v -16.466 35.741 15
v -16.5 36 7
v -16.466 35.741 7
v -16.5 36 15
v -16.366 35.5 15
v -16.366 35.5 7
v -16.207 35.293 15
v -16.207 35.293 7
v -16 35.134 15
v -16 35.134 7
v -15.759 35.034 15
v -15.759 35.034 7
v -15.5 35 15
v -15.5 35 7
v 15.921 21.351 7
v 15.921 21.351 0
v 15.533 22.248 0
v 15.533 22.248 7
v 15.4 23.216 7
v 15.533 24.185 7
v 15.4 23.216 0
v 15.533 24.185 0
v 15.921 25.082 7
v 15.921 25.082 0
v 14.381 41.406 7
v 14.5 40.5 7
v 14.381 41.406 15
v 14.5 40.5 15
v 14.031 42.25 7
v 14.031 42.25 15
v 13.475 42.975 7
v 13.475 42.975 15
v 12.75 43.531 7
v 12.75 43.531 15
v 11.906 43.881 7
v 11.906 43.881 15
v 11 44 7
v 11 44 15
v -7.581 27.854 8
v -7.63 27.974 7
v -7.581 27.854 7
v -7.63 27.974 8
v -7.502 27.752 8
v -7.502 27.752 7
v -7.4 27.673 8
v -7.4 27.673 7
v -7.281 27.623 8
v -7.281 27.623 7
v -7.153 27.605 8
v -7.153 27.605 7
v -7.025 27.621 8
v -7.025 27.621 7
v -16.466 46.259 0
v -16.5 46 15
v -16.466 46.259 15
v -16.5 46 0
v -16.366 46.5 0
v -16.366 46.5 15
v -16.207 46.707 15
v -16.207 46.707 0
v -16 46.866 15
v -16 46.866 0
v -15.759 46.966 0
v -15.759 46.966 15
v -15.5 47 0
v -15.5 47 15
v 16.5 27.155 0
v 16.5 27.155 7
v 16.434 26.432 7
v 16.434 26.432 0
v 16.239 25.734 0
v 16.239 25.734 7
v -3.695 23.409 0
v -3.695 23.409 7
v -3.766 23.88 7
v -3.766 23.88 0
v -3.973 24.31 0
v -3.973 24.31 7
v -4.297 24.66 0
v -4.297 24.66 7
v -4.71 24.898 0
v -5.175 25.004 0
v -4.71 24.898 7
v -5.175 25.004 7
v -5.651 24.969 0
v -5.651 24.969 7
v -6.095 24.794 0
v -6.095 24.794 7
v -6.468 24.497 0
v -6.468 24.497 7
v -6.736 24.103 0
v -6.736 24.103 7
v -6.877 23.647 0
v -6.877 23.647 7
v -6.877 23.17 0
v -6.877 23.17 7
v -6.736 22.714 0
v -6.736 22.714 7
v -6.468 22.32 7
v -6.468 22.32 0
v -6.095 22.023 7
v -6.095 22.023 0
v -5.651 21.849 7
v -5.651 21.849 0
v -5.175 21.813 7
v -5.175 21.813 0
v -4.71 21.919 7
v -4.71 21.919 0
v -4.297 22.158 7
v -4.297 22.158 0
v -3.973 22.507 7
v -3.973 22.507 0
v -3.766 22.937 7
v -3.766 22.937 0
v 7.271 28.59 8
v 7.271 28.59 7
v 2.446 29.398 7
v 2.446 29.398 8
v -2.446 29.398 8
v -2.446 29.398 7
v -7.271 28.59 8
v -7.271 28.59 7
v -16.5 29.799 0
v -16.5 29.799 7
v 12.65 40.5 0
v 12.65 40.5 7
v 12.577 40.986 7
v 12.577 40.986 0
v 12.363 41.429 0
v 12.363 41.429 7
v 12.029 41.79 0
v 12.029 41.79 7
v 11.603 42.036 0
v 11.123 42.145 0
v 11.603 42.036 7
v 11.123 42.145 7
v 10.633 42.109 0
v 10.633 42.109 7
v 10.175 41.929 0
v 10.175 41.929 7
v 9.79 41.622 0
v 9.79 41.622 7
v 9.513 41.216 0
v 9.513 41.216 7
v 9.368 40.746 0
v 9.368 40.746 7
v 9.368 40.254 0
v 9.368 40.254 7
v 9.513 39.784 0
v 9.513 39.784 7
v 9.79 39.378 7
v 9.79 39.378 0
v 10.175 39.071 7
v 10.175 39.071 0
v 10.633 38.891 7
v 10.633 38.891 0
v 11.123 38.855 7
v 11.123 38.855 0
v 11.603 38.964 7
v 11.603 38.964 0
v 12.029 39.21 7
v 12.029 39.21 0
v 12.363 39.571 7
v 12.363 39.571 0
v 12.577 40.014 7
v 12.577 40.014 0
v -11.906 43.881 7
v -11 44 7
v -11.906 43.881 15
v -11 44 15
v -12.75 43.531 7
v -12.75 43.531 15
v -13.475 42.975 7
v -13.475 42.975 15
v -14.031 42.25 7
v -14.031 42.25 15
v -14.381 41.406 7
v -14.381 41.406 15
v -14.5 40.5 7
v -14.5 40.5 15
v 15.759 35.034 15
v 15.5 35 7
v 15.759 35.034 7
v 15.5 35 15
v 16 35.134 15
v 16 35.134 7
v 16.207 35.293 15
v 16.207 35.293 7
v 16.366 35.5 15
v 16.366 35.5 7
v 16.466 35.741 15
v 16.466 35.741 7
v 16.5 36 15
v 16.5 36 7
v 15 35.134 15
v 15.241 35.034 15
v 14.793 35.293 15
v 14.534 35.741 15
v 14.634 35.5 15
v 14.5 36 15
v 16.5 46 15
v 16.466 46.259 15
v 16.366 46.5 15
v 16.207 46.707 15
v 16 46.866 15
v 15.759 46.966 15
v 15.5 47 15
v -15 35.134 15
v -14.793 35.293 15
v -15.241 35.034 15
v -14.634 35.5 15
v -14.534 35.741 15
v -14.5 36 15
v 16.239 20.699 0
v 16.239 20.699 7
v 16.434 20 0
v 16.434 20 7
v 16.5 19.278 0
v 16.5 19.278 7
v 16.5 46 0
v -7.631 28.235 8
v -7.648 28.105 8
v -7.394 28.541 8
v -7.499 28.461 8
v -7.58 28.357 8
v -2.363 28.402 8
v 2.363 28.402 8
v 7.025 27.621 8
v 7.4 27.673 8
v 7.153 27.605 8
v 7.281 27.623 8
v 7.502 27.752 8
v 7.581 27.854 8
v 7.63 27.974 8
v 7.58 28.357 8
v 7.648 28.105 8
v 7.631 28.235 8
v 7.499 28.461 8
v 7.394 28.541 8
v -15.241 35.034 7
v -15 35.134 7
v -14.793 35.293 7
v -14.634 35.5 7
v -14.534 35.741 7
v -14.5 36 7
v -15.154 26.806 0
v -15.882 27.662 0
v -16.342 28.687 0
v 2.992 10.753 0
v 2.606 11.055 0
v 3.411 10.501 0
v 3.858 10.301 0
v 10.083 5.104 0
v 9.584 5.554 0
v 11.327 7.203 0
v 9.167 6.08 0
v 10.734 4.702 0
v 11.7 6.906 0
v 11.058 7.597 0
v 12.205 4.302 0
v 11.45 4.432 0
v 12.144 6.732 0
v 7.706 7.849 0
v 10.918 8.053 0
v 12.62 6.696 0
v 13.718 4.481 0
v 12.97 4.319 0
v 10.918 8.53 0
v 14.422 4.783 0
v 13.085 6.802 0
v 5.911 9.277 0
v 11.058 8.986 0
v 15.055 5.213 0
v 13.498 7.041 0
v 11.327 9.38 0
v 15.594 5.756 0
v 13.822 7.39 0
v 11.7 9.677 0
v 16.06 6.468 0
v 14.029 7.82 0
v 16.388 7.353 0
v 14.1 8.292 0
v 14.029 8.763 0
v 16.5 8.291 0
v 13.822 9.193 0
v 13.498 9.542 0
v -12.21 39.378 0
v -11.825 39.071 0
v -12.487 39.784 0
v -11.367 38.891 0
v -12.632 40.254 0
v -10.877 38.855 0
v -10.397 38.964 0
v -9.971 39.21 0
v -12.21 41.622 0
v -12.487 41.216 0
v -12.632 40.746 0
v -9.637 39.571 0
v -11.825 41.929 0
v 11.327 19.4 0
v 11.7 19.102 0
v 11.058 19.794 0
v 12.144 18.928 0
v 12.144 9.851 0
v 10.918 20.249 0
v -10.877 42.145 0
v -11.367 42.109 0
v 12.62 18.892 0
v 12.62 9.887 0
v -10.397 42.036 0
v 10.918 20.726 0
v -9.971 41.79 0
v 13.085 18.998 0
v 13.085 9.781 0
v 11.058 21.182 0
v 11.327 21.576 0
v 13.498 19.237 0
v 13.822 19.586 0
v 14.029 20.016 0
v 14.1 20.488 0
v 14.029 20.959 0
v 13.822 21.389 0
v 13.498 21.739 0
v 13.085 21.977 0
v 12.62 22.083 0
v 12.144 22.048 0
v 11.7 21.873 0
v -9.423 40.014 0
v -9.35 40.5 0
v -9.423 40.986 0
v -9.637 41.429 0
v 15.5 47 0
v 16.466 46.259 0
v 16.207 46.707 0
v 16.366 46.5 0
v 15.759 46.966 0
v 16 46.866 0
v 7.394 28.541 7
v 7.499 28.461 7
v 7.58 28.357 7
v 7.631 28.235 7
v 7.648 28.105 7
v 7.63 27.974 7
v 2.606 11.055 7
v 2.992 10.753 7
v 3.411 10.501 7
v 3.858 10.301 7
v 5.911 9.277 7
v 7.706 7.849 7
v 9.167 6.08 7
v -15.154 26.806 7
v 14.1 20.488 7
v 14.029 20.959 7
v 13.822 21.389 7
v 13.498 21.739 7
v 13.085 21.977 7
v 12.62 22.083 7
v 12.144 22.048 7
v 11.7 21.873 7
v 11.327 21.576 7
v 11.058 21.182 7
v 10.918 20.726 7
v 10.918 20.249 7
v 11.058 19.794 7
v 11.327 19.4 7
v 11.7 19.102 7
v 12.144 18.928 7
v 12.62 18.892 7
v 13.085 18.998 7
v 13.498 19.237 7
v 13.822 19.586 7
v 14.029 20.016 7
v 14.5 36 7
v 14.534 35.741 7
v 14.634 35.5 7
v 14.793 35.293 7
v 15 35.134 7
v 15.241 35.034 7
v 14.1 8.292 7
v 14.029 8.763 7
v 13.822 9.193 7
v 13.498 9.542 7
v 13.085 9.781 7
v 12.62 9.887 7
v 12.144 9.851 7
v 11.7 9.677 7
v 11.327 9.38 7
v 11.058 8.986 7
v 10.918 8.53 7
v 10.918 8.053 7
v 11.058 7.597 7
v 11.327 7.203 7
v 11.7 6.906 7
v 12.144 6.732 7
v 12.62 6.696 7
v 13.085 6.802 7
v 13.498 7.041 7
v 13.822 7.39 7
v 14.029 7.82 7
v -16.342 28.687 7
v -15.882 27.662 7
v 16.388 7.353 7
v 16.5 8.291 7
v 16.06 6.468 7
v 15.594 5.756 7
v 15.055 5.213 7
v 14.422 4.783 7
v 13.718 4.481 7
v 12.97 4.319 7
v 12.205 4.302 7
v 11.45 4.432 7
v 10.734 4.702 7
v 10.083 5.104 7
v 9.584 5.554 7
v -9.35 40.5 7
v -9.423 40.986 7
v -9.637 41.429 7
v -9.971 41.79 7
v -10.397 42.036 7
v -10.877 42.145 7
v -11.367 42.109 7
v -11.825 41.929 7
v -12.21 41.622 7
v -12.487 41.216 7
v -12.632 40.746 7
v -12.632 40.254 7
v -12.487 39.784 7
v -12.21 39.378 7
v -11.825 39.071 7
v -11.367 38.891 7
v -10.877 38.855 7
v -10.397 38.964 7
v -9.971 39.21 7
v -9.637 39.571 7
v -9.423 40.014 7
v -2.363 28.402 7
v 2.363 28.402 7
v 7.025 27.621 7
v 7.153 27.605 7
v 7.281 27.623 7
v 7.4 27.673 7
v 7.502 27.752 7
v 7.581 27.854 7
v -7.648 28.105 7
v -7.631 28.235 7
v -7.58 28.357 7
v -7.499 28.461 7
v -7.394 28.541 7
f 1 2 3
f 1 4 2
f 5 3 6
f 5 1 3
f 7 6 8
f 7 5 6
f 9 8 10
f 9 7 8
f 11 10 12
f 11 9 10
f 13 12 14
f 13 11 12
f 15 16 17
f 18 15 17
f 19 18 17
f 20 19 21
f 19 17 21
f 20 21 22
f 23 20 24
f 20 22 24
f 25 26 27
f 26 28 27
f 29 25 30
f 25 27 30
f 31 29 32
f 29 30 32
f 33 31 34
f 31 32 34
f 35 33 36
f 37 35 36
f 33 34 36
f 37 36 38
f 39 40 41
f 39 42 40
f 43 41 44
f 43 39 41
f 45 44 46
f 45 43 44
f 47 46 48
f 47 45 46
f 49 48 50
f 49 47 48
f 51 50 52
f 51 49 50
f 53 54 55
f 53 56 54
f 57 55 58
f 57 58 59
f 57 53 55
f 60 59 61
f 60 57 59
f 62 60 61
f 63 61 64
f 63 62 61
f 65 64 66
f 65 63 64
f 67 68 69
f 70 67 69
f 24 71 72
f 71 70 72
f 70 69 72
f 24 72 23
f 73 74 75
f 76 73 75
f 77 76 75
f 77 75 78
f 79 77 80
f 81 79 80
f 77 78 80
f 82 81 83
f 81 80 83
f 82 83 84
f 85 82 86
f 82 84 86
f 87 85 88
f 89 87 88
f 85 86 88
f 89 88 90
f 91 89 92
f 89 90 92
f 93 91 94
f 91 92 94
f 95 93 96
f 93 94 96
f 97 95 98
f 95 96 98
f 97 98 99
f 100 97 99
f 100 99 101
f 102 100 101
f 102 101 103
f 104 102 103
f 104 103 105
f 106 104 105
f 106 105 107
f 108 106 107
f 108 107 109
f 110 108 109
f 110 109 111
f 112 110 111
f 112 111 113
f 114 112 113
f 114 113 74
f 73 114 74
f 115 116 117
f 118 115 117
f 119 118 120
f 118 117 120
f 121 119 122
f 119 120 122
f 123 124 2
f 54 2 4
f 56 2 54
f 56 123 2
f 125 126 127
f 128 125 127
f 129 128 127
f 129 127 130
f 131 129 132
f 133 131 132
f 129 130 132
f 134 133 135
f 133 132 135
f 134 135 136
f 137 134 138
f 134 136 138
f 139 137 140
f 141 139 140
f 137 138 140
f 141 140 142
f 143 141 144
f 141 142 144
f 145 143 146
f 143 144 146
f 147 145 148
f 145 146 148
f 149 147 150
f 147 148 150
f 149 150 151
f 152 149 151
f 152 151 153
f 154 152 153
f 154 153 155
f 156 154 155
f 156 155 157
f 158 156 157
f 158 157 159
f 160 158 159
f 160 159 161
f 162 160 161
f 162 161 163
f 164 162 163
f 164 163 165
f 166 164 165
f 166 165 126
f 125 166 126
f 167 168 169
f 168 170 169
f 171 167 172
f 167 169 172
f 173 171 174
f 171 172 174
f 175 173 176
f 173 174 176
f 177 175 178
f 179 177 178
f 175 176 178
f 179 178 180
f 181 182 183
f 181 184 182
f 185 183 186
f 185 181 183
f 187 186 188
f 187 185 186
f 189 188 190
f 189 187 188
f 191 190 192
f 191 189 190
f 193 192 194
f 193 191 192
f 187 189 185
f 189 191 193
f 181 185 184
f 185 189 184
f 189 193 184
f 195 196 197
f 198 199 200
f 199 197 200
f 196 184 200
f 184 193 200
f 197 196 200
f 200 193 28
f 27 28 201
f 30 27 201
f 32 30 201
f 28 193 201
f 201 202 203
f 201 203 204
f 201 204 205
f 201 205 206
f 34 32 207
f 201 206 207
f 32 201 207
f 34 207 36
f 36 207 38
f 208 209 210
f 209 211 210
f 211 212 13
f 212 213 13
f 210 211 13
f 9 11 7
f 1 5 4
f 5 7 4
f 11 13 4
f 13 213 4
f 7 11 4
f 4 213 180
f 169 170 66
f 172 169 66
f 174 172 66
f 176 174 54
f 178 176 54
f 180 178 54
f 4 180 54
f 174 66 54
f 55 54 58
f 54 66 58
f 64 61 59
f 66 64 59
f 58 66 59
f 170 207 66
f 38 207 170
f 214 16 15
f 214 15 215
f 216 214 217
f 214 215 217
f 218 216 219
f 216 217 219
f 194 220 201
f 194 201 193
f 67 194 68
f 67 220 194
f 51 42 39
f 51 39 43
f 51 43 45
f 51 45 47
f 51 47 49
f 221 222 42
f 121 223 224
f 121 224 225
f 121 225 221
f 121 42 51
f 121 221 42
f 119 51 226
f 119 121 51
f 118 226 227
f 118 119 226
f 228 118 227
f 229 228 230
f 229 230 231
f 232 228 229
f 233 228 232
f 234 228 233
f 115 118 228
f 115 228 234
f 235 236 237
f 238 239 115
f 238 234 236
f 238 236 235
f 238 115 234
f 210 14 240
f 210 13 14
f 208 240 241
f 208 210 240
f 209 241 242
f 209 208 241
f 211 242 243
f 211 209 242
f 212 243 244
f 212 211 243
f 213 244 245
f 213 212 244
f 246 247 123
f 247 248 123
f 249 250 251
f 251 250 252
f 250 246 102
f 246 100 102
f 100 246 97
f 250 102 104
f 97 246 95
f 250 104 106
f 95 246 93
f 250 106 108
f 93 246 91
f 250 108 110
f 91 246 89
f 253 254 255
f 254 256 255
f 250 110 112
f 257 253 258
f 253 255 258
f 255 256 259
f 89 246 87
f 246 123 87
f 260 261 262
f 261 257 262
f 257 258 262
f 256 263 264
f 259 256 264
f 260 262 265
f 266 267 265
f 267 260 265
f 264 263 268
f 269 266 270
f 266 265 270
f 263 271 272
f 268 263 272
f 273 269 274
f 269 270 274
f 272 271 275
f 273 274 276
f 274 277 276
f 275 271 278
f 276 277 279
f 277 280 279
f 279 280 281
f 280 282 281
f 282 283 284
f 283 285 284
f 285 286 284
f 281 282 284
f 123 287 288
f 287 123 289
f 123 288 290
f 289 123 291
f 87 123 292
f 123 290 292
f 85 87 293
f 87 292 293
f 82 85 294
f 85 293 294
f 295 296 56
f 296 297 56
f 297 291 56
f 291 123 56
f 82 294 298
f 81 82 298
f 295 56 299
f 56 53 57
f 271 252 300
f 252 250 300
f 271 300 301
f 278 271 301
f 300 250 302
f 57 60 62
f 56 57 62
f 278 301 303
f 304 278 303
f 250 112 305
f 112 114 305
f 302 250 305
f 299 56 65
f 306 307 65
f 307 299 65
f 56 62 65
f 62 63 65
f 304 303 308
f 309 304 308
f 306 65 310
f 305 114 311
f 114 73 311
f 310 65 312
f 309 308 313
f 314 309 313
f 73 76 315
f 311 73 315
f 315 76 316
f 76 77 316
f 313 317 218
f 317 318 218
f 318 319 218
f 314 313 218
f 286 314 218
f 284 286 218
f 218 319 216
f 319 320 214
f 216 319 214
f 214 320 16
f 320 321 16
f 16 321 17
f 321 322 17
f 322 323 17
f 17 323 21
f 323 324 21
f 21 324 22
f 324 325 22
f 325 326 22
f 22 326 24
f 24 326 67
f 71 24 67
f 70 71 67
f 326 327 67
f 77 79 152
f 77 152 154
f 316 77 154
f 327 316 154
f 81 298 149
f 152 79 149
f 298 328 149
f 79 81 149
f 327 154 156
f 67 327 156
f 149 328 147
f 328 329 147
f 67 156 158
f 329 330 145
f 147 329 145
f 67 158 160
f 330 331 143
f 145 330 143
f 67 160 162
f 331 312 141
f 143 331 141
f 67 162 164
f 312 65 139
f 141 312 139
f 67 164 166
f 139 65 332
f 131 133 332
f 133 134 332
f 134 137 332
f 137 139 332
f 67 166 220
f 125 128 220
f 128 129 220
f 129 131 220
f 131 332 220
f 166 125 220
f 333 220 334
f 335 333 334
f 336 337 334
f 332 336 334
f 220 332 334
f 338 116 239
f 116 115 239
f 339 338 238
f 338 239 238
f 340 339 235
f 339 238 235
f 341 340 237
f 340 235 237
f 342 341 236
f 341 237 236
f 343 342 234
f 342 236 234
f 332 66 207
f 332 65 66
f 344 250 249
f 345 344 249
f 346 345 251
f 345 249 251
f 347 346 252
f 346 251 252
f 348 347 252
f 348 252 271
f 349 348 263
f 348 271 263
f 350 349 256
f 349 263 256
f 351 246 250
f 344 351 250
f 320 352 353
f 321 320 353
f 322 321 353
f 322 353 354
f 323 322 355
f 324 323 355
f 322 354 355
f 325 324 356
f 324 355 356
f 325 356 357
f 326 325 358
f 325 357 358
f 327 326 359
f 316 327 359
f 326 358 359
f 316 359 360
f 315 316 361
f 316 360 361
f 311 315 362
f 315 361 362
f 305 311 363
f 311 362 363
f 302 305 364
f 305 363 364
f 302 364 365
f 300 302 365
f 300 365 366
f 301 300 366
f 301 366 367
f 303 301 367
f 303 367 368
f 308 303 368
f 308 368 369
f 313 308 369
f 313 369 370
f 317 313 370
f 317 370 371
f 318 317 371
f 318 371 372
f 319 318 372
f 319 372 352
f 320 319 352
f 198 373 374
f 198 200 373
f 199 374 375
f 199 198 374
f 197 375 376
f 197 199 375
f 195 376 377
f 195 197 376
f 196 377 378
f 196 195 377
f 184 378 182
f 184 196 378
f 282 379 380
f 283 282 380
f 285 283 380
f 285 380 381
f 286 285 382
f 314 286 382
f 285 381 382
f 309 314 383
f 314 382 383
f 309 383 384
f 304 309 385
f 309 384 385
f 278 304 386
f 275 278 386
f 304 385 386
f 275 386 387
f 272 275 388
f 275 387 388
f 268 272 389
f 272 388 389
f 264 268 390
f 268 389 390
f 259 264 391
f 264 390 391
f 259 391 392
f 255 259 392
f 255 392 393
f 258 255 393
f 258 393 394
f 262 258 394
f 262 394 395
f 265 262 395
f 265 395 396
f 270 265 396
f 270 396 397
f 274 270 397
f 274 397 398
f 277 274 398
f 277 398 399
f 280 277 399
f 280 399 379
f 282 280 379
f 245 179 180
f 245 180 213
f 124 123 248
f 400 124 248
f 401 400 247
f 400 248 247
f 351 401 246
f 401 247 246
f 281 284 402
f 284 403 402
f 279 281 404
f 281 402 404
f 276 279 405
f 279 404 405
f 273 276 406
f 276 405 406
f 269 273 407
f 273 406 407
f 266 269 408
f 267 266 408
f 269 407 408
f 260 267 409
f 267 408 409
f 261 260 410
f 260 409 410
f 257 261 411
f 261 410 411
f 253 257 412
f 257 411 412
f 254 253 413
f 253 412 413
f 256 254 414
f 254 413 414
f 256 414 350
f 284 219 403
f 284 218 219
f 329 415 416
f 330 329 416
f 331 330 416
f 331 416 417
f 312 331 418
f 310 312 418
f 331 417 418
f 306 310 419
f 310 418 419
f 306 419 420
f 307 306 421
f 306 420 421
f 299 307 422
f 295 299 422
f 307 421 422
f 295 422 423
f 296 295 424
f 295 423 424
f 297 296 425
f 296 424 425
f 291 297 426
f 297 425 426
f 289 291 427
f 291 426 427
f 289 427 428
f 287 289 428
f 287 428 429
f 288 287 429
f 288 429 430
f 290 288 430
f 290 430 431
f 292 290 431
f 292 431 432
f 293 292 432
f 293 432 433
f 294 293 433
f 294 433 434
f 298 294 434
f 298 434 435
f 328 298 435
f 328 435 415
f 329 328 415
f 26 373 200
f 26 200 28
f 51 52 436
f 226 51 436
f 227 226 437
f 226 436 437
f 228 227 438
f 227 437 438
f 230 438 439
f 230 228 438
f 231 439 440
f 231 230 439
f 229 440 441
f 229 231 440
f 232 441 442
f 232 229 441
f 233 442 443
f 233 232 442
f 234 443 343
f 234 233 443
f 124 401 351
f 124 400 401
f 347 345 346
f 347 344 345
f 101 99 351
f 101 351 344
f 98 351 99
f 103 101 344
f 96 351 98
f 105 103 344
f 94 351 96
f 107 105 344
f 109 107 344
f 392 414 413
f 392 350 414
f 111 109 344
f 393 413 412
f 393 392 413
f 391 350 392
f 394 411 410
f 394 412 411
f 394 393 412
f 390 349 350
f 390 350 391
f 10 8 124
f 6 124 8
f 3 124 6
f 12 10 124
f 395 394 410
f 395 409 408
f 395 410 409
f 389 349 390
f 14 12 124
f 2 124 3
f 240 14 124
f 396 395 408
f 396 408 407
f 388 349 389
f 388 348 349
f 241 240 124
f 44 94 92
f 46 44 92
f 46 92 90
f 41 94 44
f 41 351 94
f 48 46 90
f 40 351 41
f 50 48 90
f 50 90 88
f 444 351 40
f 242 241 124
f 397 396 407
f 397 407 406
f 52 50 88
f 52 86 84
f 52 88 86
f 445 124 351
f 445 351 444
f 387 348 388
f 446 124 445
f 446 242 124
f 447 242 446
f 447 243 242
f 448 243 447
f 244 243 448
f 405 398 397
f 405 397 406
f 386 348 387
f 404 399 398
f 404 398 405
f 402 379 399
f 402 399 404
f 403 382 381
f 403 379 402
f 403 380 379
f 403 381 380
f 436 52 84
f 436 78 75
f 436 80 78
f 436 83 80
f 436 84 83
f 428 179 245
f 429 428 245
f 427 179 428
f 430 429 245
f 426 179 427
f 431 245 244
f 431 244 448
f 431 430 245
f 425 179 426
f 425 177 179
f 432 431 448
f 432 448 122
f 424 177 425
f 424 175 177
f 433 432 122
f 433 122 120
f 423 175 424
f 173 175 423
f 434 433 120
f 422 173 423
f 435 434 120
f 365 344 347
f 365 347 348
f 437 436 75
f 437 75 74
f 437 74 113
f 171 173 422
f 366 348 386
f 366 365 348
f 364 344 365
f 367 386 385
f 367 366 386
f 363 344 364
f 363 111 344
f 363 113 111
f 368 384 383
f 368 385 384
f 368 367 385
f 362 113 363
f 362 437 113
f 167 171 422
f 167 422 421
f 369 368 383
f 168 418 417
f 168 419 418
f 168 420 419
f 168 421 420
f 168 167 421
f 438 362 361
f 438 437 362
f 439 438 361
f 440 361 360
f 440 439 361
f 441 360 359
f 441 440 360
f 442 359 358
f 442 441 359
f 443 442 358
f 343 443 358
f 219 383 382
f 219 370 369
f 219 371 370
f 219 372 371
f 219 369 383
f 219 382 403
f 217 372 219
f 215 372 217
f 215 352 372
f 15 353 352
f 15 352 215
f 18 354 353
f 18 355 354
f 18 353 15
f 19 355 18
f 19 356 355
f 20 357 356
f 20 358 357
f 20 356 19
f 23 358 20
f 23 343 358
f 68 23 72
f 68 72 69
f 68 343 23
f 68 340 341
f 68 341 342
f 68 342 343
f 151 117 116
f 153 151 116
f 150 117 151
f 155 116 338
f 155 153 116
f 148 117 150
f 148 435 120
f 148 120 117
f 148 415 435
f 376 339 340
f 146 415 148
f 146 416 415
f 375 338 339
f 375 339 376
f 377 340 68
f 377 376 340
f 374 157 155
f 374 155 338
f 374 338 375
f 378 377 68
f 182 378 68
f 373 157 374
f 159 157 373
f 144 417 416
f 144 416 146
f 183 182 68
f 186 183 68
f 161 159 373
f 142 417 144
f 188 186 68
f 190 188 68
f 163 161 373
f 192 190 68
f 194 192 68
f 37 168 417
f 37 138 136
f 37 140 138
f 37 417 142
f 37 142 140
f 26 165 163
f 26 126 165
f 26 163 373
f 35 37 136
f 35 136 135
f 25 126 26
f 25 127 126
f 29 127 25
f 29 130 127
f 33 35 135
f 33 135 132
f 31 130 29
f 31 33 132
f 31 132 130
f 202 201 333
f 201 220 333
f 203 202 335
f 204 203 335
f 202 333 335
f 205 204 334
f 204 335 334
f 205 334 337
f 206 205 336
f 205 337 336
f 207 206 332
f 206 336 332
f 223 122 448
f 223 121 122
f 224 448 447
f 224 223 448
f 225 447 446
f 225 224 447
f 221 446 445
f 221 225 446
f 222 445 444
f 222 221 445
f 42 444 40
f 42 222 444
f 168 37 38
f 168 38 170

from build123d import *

# Parameters (mm, degrees)
BOSS_EXTRUDE1_DEPTH = 7
BOSS_EXTRUDE2_DEPTH = 8
FILLET1_R           = 3.5
BOSS_EXTRUDE3_DEPTH = 1
FILLET5_R           = 0.5
SKETCH3_R           = 3.6
SKETCH3_R_2         = 3.55
CUT_EXTRUDE2_DEPTH  = 12
FILLET7_R           = 4
FILLET8_R           = 1
SKETCH5_R           = 1.65
SKETCH5_R_2         = 1.6
CUT_EXTRUDE3_DEPTH  = 51.450470761
FILLET12_R          = 4


# Some blends are built 0.0001 mm under size
with BuildPart() as part:
    # Sketch1 → Boss-Extrude1 (new body)
    with BuildSketch(Plane.XY):
        with BuildLine():
            Line((16.5, 47), (-16.5, 47))
            Line((-16.5, 47), (-16.5, 28))
            Line((-16.5, 28), (3.206829084, 10.522178825))
            ThreePointArc((3.206829084, 10.522178825), (7.298815617, 8.229659203), (10.063744764, 4.440837907))
            Line((10.063744764, 4.440837907), (16.5, -1.267422796))
            Line((16.5, -1.267422796), (16.5, 47))
        make_face()
    extrude(amount=BOSS_EXTRUDE1_DEPTH)

    # Sketch2 → Boss-Extrude2 (add)
    with BuildSketch(Plane.XY.offset(7)):
        Polygon((-16.5, 35), (-16.5, 47), (16.5, 47), (16.5, 35), (14.5, 35), (14.5, 44), (-14.5, 44), (-14.5, 35), align=None)
    extrude(amount=BOSS_EXTRUDE2_DEPTH)

    # Fillet1
    fillet1_edges = [part.edges().sort_by_distance(p)[0] for p in [
        (-14.5, 44, 11),
        (14.5, 44, 11),
    ]]
    fillet(fillet1_edges, radius=FILLET1_R)

    # Sketch4 → Boss-Extrude3 (add)
    with BuildSketch(Plane.XY.offset(7)):
        with BuildLine():
            ThreePointArc((7.763157895, 28.460206948), (0, 29.5), (-7.763157895, 28.460206948))
            Line((-7.763157895, 28.460206948), (-7.5, 27.49545417))
            ThreePointArc((-7.5, 27.49545417), (0, 28.5), (7.5, 27.49545417))
            Line((7.5, 27.49545417), (7.763157895, 28.460206948))
        make_face()
    extrude(amount=BOSS_EXTRUDE3_DEPTH)

    # Fillet5
    fillet5_edges = [part.edges().sort_by_distance(p)[0] for p in [
        (7.763157895, 28.460206948, 7.5),
        (7.5, 27.49545417, 7.5),
        (-7.763157895, 28.460206948, 7.5),
        (-7.5, 27.49545417, 7.5),
    ]]
    fillet(fillet5_edges, radius=FILLET5_R - 0.0001)  # a hair under: the kernel refuses the full size

    # Sketch3 → Cut-Extrude2 (cut)
    with BuildSketch(Plane(origin=(0, 0, 0), x_dir=(-1, 0, 0), z_dir=(0, 0, -1))):
        with Locations((-19, 23.216373532)):
            Circle(SKETCH3_R)
        with Locations((19, 23.216373532)):
            Circle(SKETCH3_R_2)
    extrude(amount=-CUT_EXTRUDE2_DEPTH, mode=Mode.SUBTRACT)

    # Fillet7
    # the kernel refuses this fillet: 4 mm, written as the material it takes off along each edge
    with BuildSketch(Plane(origin=(3.206829084, 10.522178825, -2.00647278), x_dir=(0.9469871930704206, -0.3212713123834835, 0), z_dir=(0, 0, 1))) as fillet7_piece_1:
        with BuildLine():
            CenterArc((0.812259209, 3.998047556), FILLET7_R, 247.170276445, 21.039469781)
            Line((-0.739715882, 0.311399578), (0, 0))
            ThreePointArc((0, 0), (0.343648127, 0.005369221), (0.687296254, 0))
        make_face()
    extrude(amount=11.012945561, mode=Mode.SUBTRACT)
    with BuildSketch(Plane(origin=(-16.5, 28, -4.497372603), x_dir=(0.7481508366108257, -0.6635286924304943, 0), z_dir=(0, 0, 1))) as fillet7_piece_2:
        with BuildLine():
            CenterArc((FILLET7_R * 0.449737260328, FILLET7_R), FILLET7_R, 221.569549454, 48.430450546)
            Line((-FILLET7_R * 0.298413576283, FILLET7_R * 0.33647130757), (0, 0))
            Line((0, 0), (FILLET7_R * 0.449737260328, 0))
        make_face()
    extrude(amount=15.994745207, mode=Mode.SUBTRACT)
    with BuildSketch(Plane(origin=(16.5, -1.267422796, -22.201864002), x_dir=(0, 1, 0), z_dir=(0, 0, 1))) as fillet7_piece_3:
        with BuildLine():
            CenterArc((8.880745601, 4), FILLET7_R, 142.478159004, 127.521840996)
            Line((5.708260703, 6.436255236), (0, 0))
            Line((0, 0), (8.880745601, 0))
        make_face()
    extrude(amount=51.403728005, mode=Mode.SUBTRACT)
    with BuildSketch(Plane(origin=(16.5, 25.806740302, 10.36976741), x_dir=(0, 1, 0), z_dir=(0, 0, -1))) as fillet7_piece_4:
        with BuildLine():
            CenterArc((1.347906964, -4), FILLET7_R, 90, 31.211180498)
            ThreePointArc((-0.724868685, -0.578947368), (-0.343707491, -0.312920562), (0, 0))
            Line((0, 0), (1.347906964, 0))
        make_face()
    extrude(amount=13.739534821, mode=Mode.SUBTRACT)
    with BuildSketch(Plane(origin=(16.5, 20.626006763, 10.36976741), x_dir=(-0.6240720217299989, 0.7813668227496173, 0), z_dir=(0, 0, -1))) as fillet7_piece_5:
        with BuildLine():
            CenterArc((1.443078305, -3.966658315), FILLET7_R, 97.402928186, 31.211180498)
            Line((-1.053209782, -0.841191024), (0, 0))
            ThreePointArc((0, 0), (0.463846598, -0.030007516), (0.927693196, 0))
        make_face()
    extrude(amount=13.739534821, mode=Mode.SUBTRACT)

    # Fillet8
    fillet8_edges = [part.edges().sort_by_distance(p)[0] for p in [
        (-16.5, 47, 7.5),
        (16.5, 47, 7.5),
        (-16.5, 35, 11),
        (-14.5, 35, 11),
        (14.5, 35, 11),
        (16.5, 35, 11),
    ]]
    fillet(fillet8_edges, radius=FILLET8_R - 0.0001)  # a hair under: the kernel refuses the full size

    # Sketch5 → Cut-Extrude3 (cut, through all)
    with BuildSketch(Plane.XY.offset(7)):
        with Locations((-11, 40.5)):
            Circle(SKETCH5_R)
        with Locations((11, 40.5)):
            Circle(SKETCH5_R)
        with Locations((12.5, 8.291561976)):
            Circle(SKETCH5_R_2)
        with Locations((12.5, 20.487801249)):
            Circle(SKETCH5_R_2)
        with Locations((-5.294742993, 23.408667127)):
            Circle(SKETCH5_R_2)
    extrude(amount=-CUT_EXTRUDE3_DEPTH, mode=Mode.SUBTRACT)

    # Fillet12
    fillet12_edges = [part.edges().sort_by_distance(p)[0] for p in [
        (10.063744764, 4.440837907, 3.5),
    ]]
    fillet(fillet12_edges, radius=FILLET12_R - 0.0001)  # a hair under: the kernel refuses the full size


solid = part.part
